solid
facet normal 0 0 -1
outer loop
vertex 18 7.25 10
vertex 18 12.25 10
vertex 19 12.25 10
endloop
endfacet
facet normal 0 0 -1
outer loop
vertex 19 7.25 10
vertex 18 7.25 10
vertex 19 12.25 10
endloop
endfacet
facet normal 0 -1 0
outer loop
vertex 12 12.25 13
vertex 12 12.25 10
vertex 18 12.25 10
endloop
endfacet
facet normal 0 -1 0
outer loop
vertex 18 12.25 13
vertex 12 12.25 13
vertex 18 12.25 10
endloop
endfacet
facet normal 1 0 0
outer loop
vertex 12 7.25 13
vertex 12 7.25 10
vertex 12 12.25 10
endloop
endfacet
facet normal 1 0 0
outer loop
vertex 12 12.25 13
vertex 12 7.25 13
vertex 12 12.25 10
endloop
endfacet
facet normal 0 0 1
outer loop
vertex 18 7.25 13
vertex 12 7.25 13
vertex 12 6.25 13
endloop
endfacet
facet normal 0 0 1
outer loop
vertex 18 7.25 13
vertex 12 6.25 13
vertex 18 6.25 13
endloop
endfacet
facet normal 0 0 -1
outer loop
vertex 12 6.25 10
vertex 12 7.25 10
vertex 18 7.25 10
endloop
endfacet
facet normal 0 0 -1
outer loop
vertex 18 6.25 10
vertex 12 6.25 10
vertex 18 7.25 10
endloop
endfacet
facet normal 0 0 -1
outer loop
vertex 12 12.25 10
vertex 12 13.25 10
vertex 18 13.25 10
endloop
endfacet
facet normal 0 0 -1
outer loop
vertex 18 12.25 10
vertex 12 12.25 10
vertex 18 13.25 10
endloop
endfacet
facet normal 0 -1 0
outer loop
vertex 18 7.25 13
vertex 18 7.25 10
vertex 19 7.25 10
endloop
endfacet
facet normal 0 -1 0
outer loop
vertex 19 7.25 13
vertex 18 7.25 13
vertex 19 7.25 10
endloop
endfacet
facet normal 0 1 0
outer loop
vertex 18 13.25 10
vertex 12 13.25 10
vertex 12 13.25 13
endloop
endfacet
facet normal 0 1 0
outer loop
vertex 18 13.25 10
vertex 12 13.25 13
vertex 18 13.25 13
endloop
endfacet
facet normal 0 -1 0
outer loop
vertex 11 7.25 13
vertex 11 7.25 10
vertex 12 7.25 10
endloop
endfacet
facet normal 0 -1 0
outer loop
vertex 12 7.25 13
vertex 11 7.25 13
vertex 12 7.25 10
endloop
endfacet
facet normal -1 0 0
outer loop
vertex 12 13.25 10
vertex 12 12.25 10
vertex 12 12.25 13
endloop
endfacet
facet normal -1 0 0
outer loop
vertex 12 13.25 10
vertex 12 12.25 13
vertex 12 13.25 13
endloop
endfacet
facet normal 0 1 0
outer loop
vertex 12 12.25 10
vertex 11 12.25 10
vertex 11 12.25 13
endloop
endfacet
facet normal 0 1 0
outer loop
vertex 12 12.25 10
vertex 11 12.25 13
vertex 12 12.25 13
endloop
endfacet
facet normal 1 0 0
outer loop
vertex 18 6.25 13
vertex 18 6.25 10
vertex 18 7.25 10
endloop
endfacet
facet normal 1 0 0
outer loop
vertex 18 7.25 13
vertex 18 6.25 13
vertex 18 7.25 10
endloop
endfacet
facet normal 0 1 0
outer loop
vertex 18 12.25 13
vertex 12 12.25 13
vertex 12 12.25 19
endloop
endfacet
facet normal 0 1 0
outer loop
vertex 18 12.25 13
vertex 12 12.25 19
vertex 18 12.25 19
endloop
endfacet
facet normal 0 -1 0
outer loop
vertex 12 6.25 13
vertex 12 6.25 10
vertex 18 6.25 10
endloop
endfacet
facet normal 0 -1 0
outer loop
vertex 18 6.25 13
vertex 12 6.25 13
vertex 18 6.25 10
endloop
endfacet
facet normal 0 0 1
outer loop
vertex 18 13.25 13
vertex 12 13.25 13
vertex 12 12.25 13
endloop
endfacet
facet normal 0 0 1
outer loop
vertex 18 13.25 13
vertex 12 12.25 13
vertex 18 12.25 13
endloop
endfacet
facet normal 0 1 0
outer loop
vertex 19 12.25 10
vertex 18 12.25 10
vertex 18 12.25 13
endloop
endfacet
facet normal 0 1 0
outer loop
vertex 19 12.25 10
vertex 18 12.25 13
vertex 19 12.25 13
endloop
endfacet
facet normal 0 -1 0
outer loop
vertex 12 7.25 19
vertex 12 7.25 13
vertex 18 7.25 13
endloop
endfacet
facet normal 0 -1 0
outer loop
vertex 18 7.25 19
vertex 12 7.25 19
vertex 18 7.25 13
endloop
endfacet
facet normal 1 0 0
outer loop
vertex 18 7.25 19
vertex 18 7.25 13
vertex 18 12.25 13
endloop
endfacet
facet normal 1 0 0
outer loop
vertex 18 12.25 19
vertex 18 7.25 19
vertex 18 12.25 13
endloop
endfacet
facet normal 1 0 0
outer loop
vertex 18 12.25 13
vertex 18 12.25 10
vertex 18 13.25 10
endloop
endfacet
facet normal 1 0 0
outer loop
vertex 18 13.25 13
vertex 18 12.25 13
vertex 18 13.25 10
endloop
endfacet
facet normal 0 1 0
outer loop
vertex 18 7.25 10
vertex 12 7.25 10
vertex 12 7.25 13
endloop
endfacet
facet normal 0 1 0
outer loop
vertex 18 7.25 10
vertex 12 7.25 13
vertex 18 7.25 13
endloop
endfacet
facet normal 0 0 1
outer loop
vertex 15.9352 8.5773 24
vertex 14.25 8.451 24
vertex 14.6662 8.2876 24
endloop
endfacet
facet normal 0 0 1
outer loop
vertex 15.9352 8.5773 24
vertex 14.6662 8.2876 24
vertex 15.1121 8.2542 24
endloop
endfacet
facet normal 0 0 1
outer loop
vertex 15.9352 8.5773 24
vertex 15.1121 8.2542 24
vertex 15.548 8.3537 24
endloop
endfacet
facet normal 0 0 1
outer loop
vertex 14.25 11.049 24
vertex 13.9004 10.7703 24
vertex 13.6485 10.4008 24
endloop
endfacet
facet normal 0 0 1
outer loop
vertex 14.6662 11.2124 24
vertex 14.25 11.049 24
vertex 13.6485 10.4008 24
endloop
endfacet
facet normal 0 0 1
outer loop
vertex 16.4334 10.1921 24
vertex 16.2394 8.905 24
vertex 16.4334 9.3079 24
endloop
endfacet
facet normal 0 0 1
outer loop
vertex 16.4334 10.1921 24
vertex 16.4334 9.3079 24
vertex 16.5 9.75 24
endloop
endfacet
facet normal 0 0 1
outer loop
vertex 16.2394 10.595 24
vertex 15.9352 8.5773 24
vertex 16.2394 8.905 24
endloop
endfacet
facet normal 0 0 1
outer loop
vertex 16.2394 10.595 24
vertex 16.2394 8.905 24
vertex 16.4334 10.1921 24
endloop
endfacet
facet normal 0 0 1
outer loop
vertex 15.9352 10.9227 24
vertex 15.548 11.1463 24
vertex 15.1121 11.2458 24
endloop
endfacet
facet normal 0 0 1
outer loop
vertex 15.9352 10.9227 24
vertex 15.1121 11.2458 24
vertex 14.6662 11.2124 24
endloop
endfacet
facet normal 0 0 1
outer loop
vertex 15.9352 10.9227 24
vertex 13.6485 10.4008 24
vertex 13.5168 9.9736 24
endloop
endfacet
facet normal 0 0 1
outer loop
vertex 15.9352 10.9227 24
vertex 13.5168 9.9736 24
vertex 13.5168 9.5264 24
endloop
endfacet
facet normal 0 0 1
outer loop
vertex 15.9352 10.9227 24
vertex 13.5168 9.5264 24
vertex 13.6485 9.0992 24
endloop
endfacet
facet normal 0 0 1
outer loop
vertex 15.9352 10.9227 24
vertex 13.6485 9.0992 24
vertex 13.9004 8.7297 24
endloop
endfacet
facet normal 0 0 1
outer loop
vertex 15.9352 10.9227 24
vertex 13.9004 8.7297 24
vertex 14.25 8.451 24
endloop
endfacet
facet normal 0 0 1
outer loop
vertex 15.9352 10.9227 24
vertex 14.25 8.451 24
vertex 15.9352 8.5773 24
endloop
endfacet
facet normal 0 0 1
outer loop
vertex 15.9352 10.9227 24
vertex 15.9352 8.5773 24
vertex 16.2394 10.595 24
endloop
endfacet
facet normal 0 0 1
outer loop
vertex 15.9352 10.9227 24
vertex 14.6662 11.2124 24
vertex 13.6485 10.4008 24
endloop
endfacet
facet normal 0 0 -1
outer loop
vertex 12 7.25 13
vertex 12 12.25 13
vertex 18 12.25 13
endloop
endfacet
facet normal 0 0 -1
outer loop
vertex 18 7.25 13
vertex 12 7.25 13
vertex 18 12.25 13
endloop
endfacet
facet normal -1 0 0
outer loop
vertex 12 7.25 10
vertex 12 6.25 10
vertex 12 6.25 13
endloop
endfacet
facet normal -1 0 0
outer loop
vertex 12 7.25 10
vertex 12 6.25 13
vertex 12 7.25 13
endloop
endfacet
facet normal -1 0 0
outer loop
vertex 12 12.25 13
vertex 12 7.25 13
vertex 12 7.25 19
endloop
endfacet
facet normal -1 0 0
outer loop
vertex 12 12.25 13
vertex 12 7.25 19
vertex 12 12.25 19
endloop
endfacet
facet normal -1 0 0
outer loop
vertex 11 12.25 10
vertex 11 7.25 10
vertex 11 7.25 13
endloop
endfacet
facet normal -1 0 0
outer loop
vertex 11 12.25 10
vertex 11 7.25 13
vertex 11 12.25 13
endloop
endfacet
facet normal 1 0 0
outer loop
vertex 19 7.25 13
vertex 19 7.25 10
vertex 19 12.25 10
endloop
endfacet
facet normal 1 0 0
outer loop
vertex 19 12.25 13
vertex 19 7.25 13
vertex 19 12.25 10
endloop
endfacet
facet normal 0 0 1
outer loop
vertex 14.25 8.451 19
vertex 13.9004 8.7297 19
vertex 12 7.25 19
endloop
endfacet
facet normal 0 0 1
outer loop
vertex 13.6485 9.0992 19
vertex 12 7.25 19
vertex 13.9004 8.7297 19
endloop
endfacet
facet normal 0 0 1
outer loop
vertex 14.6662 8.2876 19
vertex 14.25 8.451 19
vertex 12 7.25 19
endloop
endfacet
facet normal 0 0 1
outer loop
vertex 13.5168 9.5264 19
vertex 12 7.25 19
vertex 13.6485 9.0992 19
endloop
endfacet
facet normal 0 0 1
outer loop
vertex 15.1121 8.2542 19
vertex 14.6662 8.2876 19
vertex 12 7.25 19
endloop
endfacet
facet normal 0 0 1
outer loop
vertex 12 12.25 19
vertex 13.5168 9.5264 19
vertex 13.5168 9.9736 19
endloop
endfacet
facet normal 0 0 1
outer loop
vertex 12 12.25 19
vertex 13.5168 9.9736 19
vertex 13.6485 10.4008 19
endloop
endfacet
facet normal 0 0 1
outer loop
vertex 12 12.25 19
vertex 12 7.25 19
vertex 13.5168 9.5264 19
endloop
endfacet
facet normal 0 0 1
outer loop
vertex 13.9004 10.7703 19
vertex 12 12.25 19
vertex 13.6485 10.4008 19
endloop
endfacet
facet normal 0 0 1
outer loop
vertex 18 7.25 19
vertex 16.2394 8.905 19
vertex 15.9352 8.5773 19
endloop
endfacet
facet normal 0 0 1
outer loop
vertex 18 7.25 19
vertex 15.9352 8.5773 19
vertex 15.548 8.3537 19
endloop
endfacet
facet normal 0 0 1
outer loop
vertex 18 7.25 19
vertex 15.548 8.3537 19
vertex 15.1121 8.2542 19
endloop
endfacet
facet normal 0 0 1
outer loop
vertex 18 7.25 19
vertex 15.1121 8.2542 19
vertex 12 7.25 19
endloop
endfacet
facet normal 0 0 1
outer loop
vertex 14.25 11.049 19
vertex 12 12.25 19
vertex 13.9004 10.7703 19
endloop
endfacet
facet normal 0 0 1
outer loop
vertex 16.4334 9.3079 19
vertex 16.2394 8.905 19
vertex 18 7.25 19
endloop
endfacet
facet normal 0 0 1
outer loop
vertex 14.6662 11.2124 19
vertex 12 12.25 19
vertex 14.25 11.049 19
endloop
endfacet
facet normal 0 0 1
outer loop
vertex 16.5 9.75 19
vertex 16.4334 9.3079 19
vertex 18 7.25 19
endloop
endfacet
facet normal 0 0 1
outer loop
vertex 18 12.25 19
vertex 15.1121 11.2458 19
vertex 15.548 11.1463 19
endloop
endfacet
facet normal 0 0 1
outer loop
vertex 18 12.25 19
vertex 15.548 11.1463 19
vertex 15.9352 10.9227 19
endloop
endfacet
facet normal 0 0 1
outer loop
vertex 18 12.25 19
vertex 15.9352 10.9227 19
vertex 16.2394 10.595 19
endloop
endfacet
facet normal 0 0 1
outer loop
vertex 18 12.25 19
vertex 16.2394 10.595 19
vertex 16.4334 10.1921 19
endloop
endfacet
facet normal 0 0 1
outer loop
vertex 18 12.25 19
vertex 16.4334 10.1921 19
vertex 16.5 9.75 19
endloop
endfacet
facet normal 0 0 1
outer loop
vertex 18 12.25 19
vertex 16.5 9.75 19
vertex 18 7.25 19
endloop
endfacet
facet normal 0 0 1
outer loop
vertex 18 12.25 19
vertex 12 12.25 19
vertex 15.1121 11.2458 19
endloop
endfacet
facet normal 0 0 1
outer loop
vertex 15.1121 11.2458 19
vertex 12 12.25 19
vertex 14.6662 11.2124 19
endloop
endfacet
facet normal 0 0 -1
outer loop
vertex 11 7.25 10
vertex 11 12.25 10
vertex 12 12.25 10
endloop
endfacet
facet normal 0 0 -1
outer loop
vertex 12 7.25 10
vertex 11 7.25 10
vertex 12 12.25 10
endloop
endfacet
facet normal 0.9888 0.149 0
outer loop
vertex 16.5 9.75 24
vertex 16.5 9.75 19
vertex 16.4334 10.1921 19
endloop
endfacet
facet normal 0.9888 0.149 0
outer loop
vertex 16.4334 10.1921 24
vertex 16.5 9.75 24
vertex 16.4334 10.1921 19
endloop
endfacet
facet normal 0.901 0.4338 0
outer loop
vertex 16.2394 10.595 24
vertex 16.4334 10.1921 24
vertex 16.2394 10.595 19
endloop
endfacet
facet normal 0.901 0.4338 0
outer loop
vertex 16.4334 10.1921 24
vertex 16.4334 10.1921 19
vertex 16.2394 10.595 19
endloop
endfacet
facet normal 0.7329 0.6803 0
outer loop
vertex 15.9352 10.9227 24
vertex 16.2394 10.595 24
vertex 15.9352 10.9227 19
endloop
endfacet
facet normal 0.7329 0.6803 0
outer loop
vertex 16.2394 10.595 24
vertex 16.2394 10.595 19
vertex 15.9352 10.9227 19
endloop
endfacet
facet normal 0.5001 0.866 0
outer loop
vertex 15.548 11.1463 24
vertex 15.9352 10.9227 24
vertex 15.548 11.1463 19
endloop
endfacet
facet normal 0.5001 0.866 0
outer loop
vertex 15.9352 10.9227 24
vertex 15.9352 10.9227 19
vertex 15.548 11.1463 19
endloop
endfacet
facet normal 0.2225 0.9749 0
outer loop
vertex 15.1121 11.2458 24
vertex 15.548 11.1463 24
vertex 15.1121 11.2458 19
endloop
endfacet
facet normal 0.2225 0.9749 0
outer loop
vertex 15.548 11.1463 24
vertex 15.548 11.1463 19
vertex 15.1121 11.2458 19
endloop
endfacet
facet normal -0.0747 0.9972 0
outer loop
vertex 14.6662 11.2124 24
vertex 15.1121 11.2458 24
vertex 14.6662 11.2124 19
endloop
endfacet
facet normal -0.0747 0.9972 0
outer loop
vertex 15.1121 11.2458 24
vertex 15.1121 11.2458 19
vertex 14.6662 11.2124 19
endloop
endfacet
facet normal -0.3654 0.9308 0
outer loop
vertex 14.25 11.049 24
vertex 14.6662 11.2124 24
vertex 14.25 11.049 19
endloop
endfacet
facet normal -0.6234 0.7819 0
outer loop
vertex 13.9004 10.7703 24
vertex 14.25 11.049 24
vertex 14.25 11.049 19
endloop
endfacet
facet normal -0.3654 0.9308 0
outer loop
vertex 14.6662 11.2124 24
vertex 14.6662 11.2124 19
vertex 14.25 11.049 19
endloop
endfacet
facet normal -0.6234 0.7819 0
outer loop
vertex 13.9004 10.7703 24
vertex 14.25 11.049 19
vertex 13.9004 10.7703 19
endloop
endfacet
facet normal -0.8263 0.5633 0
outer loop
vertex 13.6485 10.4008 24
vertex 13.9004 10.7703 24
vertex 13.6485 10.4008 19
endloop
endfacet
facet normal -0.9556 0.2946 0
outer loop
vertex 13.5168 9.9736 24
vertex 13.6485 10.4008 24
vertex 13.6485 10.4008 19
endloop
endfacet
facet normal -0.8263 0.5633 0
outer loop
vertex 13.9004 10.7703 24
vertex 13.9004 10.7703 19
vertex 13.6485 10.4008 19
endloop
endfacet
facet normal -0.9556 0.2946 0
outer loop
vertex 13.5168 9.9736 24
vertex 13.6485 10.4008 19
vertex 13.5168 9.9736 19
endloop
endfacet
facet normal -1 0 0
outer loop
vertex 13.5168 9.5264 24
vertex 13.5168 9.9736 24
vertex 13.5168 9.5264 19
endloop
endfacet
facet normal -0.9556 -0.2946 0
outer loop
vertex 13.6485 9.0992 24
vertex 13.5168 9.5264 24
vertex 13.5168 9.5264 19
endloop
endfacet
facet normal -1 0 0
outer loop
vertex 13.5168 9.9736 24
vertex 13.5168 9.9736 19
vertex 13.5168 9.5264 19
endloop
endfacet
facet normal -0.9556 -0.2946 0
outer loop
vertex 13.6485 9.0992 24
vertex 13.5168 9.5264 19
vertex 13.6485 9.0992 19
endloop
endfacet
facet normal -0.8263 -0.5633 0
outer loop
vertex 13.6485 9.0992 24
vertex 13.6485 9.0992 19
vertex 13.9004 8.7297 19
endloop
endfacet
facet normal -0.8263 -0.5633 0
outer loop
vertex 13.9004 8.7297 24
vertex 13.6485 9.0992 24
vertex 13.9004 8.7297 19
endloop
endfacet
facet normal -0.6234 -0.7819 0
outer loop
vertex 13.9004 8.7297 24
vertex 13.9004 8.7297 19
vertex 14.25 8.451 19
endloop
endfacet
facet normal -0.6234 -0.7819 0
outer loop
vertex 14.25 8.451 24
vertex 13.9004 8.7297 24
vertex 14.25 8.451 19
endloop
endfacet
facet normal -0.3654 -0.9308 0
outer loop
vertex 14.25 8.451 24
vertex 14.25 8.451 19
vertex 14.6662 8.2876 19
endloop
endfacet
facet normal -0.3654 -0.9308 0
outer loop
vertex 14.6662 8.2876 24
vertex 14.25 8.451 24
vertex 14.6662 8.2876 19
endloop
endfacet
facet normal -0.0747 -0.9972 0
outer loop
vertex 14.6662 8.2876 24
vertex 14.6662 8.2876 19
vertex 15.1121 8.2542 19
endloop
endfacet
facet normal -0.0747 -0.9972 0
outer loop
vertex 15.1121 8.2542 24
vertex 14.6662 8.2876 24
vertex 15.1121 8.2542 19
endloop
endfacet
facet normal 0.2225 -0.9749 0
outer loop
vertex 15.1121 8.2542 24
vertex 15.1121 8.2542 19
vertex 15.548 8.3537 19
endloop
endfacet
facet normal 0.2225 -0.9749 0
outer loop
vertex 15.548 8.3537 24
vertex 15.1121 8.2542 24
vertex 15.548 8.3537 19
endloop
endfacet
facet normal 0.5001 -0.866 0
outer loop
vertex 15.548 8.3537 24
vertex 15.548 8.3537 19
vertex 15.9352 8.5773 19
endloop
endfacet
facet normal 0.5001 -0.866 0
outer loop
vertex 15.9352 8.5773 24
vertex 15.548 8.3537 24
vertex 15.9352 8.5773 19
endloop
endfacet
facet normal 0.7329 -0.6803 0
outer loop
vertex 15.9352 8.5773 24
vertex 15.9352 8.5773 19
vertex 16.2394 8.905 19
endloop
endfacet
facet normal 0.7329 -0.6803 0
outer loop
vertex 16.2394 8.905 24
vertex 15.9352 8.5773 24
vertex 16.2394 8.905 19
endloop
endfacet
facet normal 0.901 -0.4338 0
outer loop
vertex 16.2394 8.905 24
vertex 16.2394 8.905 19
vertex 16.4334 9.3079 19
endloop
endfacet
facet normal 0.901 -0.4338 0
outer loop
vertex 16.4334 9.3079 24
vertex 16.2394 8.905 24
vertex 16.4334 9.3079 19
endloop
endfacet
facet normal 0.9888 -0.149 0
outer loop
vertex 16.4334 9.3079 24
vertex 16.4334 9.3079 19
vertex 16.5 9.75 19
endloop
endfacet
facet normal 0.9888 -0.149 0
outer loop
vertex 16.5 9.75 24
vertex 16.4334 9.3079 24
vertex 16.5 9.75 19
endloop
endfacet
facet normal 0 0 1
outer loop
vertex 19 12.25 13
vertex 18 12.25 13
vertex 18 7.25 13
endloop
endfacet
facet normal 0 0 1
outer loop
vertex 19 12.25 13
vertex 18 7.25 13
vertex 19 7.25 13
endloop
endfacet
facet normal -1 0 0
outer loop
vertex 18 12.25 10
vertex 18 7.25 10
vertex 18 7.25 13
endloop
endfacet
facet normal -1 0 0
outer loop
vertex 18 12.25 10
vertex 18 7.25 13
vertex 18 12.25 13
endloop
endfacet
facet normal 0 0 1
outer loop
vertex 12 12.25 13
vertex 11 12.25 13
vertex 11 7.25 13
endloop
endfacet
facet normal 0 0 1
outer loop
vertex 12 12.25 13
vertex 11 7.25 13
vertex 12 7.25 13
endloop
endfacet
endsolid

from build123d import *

# Parameters (mm, degrees)
CYLINDER_R     = 1.5
CYLINDER_DEPTH = 10
BOX004_W       = 1
BOX004_H       = 5
BOX004_DEPTH   = 3
BOX005_W       = 1
BOX005_H       = 5
BOX005_DEPTH   = 3
BOX006_W       = 6
BOX006_H       = 1
BOX006_DEPTH   = 3
BOX007_W       = 6
BOX007_H       = 1
BOX007_DEPTH   = 3
BOX003_W       = 6
BOX003_H       = 5
BOX003_DEPTH   = 6


with BuildPart() as cylinder:
    # Cylinder → Cylinder (new body)
    with BuildSketch(Plane(origin=(15, 9.75, 10), x_dir=(1, 0, 0), z_dir=(0, 0, 1))):
        Circle(CYLINDER_R)
    extrude(amount=CYLINDER_DEPTH)


with BuildPart() as box004:
    # Box004 → Box004 (new body)
    with BuildSketch(Plane(origin=(11, 7.25, 6), x_dir=(1, 0, 0), z_dir=(0, 0, 1))):
        with Locations((0.5, 2.5)):
            Rectangle(BOX004_W, BOX004_H)
    extrude(amount=BOX004_DEPTH)


with BuildPart() as box005:
    # Box005 → Box005 (new body)
    with BuildSketch(Plane(origin=(18, 7.25, 6), x_dir=(1, 0, 0), z_dir=(0, 0, 1))):
        with Locations((0.5, 2.5)):
            Rectangle(BOX005_W, BOX005_H)
    extrude(amount=BOX005_DEPTH)


with BuildPart() as box006:
    # Box006 → Box006 (new body)
    with BuildSketch(Plane(origin=(12, 6.25, 6), x_dir=(1, 0, 0), z_dir=(0, 0, 1))):
        with Locations((3, 0.5)):
            Rectangle(BOX006_W, BOX006_H)
    extrude(amount=BOX006_DEPTH)


with BuildPart() as box007:
    # Box007 → Box007 (new body)
    with BuildSketch(Plane(origin=(12, 12.25, 6), x_dir=(1, 0, 0), z_dir=(0, 0, 1))):
        with Locations((3, 0.5)):
            Rectangle(BOX007_W, BOX007_H)
    extrude(amount=BOX007_DEPTH)


with BuildPart() as bt_ex1:
    # Box003 → Box003 (new body)
    with BuildSketch(Plane(origin=(12, 7.25, 9), x_dir=(1, 0, 0), z_dir=(0, 0, 1))):
        with Locations((3, 2.5)):
            Rectangle(BOX003_W, BOX003_H)
    extrude(amount=BOX003_DEPTH)

    # Fusion: union Box004, Box005, Box006, Box007
    add(box004.part)
    add(box005.part)
    add(box006.part)
    add(box007.part)

    # Fusion005: union Cylinder
    add(cylinder.part)


with BuildPart() as bt_ex1_1:
    # Fusion005 placement: moved
    add(bt_ex1.part.moved(Location((0, 0, 4))))


solid = bt_ex1_1.part
